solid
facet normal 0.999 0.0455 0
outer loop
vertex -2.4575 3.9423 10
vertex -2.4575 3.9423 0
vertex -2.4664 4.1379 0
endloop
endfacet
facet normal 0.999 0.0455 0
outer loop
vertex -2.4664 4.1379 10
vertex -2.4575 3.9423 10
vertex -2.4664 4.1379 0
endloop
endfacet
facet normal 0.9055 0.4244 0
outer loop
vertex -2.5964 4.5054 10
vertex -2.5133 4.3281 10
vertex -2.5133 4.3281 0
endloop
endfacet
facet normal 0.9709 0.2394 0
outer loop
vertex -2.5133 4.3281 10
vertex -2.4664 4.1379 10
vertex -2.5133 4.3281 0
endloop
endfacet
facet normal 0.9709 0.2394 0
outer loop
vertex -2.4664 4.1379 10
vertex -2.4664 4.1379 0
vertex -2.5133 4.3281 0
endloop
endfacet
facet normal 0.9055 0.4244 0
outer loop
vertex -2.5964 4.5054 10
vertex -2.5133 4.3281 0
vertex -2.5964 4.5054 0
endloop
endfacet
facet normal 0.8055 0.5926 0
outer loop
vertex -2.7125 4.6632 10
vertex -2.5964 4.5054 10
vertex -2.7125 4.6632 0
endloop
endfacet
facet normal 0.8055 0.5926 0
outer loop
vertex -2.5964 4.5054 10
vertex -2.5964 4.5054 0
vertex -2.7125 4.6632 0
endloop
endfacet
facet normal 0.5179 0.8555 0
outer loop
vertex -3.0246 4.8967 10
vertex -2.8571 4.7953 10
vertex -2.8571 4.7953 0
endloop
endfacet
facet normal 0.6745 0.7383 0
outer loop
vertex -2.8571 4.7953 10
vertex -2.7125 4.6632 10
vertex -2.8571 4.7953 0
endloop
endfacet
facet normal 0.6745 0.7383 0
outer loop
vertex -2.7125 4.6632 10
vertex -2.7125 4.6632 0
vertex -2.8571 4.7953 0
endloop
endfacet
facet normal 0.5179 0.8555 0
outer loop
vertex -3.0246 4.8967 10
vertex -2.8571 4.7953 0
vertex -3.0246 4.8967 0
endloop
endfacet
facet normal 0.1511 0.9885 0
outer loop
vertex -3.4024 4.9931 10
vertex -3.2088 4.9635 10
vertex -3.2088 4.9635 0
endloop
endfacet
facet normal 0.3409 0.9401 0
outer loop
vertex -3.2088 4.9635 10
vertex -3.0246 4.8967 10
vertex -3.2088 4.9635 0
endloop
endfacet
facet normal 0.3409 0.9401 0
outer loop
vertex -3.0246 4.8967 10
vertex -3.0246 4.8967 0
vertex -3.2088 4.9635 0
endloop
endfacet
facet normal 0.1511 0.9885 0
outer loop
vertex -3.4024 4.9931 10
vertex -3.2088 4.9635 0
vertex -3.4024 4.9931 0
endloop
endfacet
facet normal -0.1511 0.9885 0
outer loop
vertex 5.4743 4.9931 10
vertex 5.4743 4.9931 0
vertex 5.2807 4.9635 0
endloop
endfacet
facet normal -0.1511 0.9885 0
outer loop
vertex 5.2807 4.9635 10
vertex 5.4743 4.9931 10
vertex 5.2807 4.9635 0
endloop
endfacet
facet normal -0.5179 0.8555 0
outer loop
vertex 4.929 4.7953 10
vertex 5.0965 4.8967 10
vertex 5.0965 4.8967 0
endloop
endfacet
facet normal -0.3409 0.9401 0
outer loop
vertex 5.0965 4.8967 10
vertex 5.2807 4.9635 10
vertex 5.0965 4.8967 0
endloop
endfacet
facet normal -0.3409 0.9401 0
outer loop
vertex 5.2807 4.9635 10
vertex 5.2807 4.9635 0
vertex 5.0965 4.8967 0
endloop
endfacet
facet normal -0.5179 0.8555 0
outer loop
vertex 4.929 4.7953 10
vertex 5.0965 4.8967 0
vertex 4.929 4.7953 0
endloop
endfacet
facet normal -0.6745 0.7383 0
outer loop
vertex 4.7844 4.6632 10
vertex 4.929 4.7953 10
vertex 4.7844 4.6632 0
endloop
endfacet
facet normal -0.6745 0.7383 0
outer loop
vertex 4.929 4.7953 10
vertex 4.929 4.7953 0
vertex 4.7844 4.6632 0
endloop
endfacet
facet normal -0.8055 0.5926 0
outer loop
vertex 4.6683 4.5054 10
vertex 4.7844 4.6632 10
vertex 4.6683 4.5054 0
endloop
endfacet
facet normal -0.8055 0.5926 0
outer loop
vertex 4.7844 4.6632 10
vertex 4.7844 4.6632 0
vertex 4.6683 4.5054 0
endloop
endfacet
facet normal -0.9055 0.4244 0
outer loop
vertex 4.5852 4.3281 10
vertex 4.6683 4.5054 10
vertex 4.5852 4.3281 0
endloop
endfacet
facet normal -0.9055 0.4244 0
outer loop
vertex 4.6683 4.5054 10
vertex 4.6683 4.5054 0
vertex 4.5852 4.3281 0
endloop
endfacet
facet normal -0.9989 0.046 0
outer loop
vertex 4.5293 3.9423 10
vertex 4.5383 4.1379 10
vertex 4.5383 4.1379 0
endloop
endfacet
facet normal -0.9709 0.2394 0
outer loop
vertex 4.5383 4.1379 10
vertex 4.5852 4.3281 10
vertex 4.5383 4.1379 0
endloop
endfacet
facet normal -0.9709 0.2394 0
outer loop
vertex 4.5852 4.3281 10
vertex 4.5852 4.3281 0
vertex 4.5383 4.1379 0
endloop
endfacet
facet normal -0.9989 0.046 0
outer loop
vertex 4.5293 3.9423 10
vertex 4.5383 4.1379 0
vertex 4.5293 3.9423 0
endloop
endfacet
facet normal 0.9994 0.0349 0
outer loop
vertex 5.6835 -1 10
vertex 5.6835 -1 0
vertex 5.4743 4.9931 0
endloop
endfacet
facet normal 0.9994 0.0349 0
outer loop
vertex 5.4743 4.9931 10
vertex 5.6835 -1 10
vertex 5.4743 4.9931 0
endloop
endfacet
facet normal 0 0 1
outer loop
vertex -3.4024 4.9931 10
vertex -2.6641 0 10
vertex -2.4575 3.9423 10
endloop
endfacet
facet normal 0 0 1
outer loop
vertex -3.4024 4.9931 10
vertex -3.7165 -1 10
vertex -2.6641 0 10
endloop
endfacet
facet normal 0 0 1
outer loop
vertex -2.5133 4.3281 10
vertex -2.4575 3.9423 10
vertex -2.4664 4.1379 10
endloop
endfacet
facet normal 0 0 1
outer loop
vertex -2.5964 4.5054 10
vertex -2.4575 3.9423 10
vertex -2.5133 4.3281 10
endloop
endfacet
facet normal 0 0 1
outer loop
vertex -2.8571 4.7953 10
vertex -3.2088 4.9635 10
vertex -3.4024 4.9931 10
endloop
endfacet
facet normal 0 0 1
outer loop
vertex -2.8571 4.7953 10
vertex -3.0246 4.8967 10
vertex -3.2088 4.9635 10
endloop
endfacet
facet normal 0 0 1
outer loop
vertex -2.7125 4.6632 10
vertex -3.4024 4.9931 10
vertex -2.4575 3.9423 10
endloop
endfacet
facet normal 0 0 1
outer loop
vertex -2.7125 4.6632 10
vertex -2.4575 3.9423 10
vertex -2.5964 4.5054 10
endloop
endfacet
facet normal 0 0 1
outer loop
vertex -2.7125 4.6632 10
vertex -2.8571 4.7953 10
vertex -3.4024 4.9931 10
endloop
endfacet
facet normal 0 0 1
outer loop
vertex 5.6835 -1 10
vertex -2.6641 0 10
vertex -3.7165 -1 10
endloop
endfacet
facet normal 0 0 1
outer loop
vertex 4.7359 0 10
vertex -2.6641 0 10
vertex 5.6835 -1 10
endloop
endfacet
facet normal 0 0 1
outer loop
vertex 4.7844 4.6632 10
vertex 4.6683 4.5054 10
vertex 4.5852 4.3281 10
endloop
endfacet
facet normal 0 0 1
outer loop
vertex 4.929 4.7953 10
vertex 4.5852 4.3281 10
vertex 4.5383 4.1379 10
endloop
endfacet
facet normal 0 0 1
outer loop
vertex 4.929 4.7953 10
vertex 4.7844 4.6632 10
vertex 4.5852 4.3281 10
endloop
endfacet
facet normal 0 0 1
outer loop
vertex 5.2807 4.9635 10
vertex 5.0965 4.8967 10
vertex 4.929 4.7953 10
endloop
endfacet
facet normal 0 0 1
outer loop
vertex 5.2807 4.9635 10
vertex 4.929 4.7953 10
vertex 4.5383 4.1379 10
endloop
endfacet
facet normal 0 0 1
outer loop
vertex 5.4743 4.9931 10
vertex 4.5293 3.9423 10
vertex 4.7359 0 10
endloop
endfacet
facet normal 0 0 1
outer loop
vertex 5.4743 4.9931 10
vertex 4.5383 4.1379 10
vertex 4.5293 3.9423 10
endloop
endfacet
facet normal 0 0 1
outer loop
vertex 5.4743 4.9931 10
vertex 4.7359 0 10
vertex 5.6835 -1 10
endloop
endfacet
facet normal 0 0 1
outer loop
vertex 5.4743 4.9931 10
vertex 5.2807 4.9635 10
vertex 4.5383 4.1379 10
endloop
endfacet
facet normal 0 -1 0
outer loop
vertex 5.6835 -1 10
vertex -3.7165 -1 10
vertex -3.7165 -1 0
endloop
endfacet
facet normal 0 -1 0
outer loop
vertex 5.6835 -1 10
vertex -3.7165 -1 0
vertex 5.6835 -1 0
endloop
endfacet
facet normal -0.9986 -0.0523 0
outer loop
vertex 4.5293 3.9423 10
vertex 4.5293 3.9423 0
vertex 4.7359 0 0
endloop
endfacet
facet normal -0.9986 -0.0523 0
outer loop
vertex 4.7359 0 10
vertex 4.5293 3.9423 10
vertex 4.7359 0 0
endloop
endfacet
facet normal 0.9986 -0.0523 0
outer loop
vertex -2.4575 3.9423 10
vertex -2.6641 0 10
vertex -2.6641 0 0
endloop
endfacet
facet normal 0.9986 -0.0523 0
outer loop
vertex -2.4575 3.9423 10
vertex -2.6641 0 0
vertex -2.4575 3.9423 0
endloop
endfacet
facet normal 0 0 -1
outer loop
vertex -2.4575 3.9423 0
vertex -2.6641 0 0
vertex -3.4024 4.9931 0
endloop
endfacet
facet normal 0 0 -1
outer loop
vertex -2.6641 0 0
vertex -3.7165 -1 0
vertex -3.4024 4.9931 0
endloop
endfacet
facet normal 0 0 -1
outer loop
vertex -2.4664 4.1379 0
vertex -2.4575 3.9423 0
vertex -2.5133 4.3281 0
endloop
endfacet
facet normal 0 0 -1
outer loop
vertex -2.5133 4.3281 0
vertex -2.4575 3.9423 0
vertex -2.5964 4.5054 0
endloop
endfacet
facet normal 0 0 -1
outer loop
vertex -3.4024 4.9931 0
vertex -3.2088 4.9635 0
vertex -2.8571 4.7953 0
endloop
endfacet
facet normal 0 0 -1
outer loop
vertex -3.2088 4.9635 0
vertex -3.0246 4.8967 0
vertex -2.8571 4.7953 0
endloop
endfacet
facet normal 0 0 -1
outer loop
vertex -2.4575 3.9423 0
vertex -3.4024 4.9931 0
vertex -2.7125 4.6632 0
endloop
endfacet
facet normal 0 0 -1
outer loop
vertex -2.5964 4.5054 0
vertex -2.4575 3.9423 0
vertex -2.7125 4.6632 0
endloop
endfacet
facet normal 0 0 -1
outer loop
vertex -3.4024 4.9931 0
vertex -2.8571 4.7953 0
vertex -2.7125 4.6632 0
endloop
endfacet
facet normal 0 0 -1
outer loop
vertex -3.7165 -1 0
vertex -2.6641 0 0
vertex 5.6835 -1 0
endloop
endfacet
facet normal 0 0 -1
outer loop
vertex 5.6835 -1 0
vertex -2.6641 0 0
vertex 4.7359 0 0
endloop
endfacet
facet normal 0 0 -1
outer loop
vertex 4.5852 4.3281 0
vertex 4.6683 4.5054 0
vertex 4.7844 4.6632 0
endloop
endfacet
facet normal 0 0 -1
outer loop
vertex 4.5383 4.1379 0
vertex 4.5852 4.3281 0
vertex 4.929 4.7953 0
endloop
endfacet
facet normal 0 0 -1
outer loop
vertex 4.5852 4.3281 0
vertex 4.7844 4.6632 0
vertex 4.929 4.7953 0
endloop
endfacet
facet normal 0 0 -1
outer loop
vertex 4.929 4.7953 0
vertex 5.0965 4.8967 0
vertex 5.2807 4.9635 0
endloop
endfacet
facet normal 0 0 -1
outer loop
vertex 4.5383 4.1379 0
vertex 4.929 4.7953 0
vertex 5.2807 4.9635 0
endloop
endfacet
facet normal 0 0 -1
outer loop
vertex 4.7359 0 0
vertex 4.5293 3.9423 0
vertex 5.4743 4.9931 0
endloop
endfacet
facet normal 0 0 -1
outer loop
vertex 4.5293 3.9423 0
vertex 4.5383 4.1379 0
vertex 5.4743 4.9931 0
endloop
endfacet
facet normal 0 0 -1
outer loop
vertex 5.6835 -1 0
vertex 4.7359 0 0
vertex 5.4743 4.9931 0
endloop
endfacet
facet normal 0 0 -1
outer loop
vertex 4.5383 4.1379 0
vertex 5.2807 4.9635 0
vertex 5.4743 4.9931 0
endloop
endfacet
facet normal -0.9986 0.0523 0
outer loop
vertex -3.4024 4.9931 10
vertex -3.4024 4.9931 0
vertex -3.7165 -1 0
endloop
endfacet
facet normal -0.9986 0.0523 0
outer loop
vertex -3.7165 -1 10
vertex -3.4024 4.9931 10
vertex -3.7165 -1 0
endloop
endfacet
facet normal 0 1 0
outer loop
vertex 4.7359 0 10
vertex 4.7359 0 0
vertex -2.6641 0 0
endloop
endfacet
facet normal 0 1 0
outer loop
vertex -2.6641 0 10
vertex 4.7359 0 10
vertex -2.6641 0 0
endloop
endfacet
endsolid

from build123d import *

# Parameters (mm, degrees)
F1_DEPTH    = 10
F2_T1_DEPTH = 15.2616750858


# Not quite as in the source:
# - a fillet or chamfer that OpenCascade refuses, or shapes differently, is made with other operations: its cross-section is extruded or revolved along the edge and cut away or added


with BuildPart() as f1:
    # F0 (on Top) → F1 (new body)
    with BuildSketch(Plane.XY):
        Polygon((4.7359447583, 0), (-2.6640552417, 0), (-2.4023754605, 4.9931476738), (-3.4023754605, 4.9931476738), (-3.716463021, -1), (5.683536979, -1), (5.474264977, 4.9931476738), (4.474264977, 4.9931476738), align=None)
    extrude(amount=F1_DEPTH)

    # F2: fillet of radius 1 on 2 edges, made by hand

    # F2_s2 → F2_t1 (cut)
    with BuildSketch(Plane.XY.offset(-2.6308375429)):
        with BuildLine():
            ThreePointArc((5.474264977, 4.9931476738), (4.78436631, 4.6632120235), (4.5293399365, 3.9422548452))
            Line((4.5293399365, 3.9422548452), (4.474264977, 4.9931476738))
            Line((4.474264977, 4.9931476738), (5.474264977, 4.9931476738))
        make_face()
        with BuildLine():
            ThreePointArc((-2.4574504199, 3.9422548452), (-2.7124767935, 4.6632120235), (-3.4023754605, 4.9931476738))
            Line((-3.4023754605, 4.9931476738), (-2.4023754605, 4.9931476738))
            Line((-2.4023754605, 4.9931476738), (-2.4574504199, 3.9422548452))
        make_face()
    extrude(amount=F2_T1_DEPTH, mode=Mode.SUBTRACT)


solid = f1.part
